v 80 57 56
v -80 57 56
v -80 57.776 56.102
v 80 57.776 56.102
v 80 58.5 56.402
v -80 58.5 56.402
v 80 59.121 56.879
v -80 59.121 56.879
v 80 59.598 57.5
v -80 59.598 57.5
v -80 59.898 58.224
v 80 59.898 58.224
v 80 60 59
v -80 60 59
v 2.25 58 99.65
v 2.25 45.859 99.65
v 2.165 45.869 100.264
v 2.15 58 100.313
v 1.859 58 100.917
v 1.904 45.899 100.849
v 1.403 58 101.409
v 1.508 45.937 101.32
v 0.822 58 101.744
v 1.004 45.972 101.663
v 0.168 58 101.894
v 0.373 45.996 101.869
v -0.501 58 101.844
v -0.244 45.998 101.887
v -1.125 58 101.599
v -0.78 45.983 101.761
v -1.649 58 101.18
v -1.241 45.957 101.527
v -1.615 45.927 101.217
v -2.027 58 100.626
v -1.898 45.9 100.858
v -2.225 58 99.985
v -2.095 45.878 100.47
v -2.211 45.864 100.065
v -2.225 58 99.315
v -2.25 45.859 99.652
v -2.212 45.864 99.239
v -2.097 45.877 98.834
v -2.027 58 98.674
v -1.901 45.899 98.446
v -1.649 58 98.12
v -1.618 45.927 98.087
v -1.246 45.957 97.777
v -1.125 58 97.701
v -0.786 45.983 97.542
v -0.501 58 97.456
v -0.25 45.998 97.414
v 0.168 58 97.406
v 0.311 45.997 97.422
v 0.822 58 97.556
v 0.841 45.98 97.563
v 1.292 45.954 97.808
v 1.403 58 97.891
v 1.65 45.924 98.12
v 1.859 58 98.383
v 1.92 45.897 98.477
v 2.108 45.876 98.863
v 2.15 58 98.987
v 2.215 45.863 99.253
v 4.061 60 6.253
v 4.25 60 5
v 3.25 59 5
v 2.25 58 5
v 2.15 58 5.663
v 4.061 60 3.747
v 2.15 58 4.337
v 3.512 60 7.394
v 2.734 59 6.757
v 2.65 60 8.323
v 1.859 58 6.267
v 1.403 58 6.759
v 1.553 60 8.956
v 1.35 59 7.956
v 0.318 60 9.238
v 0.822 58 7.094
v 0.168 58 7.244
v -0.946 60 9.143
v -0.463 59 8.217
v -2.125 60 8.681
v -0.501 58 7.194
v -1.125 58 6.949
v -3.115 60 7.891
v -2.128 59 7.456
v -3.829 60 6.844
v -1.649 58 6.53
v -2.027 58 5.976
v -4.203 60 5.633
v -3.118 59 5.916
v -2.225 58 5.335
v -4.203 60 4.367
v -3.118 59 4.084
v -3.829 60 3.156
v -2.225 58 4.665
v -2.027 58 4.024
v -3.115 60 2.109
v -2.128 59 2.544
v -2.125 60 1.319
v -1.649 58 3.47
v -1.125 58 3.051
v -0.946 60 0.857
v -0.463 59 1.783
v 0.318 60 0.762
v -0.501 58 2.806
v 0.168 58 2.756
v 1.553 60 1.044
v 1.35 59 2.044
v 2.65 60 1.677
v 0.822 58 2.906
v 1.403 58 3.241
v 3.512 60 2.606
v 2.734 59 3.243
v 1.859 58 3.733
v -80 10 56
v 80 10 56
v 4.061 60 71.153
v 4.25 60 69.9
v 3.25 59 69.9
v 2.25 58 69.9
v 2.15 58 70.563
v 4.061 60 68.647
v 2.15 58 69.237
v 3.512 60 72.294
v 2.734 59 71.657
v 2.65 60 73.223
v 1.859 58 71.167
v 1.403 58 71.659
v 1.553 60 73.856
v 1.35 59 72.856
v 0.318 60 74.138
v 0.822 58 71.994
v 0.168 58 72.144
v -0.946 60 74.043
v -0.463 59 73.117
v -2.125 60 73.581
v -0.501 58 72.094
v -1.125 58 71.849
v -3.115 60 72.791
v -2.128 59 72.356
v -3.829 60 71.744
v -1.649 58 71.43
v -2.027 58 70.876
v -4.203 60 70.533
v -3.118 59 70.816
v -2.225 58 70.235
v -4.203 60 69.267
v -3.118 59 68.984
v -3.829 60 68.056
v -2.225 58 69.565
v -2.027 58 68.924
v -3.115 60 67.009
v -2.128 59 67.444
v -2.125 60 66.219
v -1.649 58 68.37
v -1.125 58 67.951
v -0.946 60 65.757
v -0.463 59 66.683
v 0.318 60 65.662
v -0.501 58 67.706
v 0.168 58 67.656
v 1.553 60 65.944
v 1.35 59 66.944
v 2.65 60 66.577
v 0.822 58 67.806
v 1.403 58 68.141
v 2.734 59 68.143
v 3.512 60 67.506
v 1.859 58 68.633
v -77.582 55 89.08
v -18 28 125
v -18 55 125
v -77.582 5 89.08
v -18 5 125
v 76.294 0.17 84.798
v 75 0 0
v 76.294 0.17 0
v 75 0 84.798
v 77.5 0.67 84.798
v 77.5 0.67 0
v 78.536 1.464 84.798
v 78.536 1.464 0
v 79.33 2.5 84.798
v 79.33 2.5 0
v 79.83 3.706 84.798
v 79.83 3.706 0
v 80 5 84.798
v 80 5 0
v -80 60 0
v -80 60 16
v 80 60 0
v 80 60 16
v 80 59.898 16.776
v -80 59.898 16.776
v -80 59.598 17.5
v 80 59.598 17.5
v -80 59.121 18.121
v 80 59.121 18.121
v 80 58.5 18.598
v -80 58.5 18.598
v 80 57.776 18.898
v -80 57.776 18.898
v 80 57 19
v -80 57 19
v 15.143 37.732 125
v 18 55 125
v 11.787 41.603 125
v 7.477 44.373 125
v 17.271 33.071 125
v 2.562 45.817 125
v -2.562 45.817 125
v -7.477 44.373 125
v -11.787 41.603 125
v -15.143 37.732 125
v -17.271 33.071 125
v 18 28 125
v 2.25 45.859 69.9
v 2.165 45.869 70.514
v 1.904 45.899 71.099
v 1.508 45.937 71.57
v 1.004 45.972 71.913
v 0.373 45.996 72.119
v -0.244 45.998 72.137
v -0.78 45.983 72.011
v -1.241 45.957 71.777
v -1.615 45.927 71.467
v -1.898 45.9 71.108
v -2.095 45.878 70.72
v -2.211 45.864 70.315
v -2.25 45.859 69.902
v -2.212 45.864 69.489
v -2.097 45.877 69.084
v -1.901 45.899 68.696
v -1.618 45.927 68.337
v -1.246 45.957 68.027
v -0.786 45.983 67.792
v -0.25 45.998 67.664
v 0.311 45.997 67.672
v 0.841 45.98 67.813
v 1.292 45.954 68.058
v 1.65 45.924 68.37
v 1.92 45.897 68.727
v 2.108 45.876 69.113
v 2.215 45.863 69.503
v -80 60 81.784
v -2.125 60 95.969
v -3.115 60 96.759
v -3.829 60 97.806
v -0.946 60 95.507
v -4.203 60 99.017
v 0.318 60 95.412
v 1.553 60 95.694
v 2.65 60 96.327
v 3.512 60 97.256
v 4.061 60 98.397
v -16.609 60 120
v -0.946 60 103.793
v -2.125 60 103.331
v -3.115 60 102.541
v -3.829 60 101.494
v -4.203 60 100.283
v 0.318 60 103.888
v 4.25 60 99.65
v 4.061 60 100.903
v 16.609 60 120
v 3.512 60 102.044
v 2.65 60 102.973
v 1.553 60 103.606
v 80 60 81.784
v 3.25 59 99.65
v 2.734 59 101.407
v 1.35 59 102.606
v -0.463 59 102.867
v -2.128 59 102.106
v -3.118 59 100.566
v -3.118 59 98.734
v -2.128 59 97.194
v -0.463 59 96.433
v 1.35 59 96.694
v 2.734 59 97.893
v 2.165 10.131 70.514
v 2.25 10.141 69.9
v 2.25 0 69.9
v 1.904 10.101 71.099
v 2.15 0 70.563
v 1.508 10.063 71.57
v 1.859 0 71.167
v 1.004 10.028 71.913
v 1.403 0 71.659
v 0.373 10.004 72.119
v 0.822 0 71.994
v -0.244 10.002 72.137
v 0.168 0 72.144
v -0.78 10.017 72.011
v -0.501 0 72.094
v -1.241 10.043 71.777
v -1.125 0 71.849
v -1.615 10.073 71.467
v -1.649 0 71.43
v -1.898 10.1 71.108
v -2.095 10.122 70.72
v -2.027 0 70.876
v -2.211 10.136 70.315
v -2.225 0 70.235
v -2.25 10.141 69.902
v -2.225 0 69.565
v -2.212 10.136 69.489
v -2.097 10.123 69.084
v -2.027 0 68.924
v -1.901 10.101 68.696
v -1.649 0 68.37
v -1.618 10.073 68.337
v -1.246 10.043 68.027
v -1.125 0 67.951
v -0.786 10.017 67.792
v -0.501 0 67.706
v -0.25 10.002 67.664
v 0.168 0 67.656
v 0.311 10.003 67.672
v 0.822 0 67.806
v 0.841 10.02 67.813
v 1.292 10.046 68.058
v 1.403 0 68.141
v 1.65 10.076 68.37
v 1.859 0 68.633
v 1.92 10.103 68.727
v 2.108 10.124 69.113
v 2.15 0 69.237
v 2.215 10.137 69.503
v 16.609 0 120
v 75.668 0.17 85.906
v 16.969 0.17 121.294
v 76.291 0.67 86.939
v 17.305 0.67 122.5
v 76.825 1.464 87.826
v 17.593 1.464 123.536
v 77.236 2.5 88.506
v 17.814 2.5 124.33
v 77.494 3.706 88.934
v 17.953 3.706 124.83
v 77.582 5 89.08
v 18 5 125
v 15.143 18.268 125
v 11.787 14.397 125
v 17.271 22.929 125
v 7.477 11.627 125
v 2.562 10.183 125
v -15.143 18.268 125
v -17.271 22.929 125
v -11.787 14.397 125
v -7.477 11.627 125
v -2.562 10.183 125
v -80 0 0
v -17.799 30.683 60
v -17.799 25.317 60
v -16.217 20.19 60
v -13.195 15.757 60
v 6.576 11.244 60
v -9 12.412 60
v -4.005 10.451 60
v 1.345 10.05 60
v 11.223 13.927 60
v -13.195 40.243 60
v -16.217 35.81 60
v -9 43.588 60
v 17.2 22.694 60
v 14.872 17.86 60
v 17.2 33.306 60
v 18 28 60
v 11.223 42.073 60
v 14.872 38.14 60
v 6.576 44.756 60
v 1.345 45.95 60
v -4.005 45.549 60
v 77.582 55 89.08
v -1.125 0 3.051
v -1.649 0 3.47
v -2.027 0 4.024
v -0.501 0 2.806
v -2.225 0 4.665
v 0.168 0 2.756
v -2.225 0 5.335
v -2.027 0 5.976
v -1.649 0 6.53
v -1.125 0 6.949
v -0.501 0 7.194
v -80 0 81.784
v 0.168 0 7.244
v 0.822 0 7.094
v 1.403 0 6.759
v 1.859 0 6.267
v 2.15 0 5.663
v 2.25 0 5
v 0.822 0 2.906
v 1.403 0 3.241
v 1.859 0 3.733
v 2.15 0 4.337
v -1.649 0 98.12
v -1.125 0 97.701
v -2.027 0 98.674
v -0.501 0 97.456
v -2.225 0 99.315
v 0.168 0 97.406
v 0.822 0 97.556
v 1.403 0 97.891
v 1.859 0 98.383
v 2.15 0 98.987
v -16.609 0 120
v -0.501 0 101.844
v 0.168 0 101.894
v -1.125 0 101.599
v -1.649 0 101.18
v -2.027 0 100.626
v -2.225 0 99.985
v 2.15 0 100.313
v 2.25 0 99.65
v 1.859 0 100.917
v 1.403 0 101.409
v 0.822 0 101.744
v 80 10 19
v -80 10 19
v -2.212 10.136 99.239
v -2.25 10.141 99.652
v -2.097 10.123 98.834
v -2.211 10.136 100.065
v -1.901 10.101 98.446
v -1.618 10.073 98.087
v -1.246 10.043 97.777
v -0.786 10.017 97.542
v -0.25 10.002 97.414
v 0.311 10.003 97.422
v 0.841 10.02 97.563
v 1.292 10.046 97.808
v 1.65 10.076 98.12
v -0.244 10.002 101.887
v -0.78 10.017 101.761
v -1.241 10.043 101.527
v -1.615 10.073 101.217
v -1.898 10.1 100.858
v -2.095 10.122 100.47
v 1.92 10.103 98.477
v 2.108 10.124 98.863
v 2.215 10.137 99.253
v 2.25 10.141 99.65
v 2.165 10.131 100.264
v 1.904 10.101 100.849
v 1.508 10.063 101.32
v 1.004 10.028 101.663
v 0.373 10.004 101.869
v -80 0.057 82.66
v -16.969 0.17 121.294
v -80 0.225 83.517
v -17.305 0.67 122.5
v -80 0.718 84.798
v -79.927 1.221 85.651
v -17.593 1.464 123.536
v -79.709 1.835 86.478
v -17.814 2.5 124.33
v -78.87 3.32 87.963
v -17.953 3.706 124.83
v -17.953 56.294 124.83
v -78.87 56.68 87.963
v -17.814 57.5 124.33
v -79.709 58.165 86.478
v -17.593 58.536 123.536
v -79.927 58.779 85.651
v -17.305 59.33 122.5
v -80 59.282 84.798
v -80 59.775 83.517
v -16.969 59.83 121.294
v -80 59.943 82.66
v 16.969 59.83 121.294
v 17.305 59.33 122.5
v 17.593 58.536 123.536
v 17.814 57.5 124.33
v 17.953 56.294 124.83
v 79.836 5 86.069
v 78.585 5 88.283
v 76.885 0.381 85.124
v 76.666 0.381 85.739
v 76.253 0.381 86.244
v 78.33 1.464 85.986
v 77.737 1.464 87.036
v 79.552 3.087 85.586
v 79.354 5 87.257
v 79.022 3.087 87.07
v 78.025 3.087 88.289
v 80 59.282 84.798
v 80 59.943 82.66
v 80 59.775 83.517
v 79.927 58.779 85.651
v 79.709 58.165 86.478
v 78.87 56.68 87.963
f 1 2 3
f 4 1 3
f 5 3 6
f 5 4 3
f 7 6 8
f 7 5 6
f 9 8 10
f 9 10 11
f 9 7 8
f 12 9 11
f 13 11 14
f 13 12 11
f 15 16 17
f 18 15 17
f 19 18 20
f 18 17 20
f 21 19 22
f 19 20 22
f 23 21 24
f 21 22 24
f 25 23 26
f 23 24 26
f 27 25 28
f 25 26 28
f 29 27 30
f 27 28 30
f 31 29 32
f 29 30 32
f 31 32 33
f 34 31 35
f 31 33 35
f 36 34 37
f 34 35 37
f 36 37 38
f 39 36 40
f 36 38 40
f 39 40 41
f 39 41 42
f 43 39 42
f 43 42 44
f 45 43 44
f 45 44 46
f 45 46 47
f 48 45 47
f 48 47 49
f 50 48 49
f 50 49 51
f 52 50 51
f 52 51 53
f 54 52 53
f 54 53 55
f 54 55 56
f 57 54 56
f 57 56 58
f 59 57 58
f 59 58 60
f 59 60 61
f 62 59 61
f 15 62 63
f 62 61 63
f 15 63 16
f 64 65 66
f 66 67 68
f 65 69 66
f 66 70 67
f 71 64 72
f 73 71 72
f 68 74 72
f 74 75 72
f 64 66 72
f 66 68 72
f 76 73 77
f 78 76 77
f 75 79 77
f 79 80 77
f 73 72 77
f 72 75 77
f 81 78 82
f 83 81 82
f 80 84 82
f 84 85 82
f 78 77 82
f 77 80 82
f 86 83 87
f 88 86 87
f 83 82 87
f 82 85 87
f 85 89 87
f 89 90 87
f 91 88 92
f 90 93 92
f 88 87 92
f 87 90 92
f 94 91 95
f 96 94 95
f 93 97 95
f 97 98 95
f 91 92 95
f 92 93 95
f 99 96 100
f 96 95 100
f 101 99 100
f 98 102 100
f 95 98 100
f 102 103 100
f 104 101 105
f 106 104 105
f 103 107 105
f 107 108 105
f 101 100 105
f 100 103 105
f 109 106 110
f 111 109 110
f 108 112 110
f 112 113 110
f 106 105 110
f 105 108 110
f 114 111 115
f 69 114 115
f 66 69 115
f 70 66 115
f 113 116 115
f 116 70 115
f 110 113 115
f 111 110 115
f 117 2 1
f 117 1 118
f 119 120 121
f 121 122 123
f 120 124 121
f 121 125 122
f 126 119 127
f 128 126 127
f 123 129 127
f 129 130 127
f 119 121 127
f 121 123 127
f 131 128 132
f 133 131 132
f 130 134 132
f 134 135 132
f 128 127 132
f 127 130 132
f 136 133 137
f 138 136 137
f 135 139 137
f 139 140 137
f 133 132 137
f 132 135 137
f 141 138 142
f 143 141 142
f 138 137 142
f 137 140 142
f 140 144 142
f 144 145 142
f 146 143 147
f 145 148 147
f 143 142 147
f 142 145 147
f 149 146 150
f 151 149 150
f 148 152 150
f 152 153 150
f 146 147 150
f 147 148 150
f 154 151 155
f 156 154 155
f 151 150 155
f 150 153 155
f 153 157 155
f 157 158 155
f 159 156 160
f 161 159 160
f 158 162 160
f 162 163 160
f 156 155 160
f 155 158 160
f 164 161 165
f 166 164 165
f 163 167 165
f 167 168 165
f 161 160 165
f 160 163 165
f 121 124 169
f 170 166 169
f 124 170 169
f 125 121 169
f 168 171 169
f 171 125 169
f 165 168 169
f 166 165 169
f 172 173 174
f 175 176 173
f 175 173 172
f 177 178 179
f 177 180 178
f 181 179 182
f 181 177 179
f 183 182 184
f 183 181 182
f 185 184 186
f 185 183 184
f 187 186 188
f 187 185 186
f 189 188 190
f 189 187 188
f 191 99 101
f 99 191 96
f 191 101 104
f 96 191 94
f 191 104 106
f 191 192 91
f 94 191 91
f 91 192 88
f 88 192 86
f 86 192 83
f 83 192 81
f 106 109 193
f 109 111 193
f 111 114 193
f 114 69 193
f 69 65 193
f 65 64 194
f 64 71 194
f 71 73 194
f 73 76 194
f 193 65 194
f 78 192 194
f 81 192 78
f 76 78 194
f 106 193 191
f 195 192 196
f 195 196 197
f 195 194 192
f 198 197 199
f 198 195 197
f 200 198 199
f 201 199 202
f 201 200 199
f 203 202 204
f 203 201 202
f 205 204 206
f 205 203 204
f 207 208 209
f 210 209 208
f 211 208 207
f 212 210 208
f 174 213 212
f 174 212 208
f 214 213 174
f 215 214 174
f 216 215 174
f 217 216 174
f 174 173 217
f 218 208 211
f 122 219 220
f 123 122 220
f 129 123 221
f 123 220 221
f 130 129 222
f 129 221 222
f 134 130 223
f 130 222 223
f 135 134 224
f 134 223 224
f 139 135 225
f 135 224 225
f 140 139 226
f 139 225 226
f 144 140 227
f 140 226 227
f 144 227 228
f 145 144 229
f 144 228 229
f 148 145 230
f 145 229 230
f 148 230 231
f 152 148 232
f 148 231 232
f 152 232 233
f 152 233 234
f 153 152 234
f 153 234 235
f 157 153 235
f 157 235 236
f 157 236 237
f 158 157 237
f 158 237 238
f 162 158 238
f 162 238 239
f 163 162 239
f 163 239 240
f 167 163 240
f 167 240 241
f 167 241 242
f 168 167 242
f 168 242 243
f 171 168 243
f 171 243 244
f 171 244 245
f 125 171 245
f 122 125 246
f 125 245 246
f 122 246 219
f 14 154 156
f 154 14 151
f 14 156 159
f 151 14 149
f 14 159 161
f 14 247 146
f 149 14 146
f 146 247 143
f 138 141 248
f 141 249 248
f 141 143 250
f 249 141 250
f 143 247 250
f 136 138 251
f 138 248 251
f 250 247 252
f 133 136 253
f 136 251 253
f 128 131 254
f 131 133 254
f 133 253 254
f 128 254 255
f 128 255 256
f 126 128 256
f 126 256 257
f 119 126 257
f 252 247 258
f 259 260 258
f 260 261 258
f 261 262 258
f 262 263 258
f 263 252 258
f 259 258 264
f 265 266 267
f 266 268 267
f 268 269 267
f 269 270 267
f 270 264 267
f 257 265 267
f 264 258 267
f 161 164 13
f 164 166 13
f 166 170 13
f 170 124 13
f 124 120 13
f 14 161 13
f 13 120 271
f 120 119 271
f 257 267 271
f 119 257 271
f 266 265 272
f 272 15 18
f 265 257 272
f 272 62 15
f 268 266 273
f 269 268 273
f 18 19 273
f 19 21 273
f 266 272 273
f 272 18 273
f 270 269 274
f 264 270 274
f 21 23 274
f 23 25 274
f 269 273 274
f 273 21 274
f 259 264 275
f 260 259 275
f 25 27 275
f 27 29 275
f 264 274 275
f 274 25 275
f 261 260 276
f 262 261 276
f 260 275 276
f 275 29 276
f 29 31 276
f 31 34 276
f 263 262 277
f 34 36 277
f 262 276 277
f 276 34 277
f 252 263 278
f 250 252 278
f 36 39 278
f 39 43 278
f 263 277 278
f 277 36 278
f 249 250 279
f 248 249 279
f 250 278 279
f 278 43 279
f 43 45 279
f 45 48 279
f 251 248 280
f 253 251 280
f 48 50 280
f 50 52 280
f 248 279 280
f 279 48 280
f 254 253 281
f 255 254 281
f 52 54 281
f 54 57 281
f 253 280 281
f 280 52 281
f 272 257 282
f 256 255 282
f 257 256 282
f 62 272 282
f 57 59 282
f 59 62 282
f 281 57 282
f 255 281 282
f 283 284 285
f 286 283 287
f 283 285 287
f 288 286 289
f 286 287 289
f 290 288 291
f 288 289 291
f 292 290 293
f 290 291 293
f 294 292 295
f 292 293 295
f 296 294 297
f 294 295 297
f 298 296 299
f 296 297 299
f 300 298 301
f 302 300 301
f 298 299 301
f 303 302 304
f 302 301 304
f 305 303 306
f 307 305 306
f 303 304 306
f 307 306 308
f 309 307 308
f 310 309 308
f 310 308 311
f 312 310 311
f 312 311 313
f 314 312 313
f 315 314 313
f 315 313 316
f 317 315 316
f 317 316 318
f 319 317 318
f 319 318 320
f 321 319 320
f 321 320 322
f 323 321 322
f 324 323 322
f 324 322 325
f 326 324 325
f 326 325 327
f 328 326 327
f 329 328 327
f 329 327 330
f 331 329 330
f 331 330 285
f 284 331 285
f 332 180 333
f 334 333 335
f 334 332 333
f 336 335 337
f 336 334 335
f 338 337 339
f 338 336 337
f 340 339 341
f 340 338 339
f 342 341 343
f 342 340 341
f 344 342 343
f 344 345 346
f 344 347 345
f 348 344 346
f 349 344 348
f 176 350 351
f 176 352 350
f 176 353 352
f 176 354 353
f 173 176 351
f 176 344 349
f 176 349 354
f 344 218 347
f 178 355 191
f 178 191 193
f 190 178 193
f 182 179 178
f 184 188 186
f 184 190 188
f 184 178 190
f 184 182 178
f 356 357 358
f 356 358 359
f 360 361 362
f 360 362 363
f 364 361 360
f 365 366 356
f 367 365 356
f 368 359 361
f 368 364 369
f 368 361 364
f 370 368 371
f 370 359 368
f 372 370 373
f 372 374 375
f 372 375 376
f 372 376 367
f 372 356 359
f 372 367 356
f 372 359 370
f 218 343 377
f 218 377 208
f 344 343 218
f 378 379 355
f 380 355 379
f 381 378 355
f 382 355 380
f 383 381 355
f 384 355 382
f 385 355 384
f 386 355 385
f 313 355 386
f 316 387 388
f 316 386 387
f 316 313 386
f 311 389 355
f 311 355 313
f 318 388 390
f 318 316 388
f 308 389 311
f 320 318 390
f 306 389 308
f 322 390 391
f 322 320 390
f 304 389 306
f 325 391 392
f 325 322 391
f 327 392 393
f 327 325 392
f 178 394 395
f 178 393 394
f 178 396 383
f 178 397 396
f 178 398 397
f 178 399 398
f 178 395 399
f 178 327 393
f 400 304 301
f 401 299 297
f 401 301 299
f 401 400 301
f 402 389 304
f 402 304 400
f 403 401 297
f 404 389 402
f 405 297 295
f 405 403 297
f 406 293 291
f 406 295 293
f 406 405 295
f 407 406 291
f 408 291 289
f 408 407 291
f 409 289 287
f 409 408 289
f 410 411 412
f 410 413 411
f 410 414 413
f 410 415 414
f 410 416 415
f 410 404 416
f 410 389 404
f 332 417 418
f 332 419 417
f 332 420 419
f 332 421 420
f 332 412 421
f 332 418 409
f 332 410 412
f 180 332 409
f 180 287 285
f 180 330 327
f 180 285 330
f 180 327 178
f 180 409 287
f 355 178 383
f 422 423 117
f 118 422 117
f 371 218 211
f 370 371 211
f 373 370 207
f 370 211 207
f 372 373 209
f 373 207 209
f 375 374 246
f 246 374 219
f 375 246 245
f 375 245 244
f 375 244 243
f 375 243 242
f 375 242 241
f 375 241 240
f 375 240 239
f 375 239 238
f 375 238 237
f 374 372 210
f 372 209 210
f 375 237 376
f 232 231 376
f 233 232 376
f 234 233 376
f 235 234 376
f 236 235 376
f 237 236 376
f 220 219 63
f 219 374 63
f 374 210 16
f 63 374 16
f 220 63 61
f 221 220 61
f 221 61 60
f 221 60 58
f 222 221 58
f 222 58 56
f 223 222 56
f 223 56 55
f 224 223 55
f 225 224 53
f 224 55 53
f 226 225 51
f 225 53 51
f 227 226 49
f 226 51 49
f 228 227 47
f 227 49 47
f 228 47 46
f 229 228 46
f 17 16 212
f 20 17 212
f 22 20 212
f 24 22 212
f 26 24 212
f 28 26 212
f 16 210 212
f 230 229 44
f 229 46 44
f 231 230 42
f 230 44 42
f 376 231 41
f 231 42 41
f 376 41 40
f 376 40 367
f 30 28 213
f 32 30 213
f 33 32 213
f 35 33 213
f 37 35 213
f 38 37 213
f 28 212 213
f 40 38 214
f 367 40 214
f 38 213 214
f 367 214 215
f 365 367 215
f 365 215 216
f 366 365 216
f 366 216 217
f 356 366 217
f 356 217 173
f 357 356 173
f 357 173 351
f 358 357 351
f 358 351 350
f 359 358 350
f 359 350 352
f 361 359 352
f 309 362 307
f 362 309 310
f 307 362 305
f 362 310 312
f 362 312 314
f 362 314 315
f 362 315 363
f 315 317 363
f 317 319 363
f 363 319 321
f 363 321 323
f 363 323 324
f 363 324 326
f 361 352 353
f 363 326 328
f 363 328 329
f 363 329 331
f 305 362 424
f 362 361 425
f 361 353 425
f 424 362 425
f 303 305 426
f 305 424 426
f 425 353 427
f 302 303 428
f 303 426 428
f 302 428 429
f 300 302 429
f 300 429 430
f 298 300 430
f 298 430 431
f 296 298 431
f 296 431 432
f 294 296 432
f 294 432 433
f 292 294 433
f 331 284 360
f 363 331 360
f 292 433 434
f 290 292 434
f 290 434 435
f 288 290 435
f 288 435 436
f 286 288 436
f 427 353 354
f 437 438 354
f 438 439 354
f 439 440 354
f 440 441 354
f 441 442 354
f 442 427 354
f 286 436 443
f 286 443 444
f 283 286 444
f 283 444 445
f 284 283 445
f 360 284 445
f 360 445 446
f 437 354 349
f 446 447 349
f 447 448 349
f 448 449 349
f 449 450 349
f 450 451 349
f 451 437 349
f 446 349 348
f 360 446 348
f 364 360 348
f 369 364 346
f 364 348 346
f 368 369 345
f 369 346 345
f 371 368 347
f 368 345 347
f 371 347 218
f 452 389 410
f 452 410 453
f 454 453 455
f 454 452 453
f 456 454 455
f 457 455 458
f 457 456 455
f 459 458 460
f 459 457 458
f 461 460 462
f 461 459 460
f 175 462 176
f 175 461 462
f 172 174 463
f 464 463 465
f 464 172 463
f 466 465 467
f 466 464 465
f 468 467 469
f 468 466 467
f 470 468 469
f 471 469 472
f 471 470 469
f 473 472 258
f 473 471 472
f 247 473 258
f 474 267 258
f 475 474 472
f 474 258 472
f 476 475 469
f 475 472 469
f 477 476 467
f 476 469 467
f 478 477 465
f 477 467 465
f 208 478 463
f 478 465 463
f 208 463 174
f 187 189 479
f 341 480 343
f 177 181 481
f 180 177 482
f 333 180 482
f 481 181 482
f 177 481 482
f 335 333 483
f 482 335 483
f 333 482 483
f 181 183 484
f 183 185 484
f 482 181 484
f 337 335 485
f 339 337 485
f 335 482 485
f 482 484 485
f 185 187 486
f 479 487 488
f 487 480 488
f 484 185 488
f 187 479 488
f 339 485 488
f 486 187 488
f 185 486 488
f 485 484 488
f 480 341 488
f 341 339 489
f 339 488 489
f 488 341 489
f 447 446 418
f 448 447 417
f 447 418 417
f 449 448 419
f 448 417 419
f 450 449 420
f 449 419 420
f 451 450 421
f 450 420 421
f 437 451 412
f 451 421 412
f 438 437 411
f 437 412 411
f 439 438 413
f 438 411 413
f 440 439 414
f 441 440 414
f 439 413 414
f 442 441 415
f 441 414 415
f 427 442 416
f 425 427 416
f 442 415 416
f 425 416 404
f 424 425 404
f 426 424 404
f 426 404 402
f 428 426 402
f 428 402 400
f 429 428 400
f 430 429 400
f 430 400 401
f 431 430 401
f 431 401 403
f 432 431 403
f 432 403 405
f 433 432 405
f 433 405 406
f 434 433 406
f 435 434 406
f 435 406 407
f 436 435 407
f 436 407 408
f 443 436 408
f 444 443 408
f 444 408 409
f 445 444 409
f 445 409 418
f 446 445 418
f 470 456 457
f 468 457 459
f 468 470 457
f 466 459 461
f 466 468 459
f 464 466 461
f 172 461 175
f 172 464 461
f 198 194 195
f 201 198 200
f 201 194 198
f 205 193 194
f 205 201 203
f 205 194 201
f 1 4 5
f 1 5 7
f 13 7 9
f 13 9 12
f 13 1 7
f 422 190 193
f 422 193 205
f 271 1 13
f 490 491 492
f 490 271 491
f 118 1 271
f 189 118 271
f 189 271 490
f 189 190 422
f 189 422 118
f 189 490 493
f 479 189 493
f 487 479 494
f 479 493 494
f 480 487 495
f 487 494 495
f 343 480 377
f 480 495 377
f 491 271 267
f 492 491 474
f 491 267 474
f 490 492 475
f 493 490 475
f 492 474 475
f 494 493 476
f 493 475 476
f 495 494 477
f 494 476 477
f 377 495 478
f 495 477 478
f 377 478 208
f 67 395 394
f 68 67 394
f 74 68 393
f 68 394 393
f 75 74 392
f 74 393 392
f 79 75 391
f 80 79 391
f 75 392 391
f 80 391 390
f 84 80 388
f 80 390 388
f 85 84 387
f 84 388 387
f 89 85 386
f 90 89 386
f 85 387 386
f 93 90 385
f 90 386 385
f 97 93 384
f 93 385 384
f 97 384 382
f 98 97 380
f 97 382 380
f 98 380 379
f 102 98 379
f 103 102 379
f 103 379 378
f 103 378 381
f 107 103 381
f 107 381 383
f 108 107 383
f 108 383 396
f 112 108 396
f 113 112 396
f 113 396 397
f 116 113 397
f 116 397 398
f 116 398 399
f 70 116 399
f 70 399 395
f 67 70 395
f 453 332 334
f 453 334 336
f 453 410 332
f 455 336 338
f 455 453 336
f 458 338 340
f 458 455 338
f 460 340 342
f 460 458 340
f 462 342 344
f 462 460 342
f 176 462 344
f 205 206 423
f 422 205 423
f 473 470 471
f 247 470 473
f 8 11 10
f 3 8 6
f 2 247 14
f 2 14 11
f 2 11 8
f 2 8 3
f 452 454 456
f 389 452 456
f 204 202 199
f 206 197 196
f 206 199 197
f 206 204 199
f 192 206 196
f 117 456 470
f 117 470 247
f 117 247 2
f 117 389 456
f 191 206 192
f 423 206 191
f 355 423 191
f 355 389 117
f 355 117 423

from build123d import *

# Parameters (mm, degrees)
F1_DEPTH = 60
F3_W     = 50
F3_H     = 37
F4_DEPTH = 160
F5_DEPTH = 65
F6_R     = 3
F7_R     = 5
F8_R     = 2.25
F9_DEPTH = 60.001
F10_SIZE = 2


with BuildPart() as f1:
    # F0 (on Front) → F1 (new body)
    with BuildSketch(Plane.XZ):
        Polygon((-80, 87.622), (-80, 0), (80, 0), (80, 87.622), (18, 125), (-18, 125), align=None)
    extrude(amount=-F1_DEPTH)

    # F3 (on face) → F4 (cut, through all)
    with BuildSketch(Plane(origin=(-80, 0, 0), x_dir=(0, -1, 0), z_dir=(-1, 0, 0))):
        with Locations((-35, 37.5)):
            Rectangle(F3_W, F3_H)
    extrude(amount=-F4_DEPTH, mode=Mode.SUBTRACT)

    # F2 (on face) → F5 (cut)
    with BuildSketch(Plane.XY.offset(125)):
        with BuildLine():
            ThreePointArc((-18, 28), (0, 10), (18, 28))
            ThreePointArc((18, 28), (0, 46), (-18, 28))
        make_face()
    extrude(amount=-F5_DEPTH, mode=Mode.SUBTRACT)

    # F6
    f6_edges = [f1.edges().sort_by_distance(p)[0] for p in [
        (0, 60, 56),
        (0, 60, 19),
    ]]
    fillet(f6_edges, radius=F6_R)

    # F7
    f7_edges = [f1.edges().sort_by_distance(p)[0] for p in [
        (0, 60, 125),
        (-49, 60, 106.311),
        (49, 60, 106.311),
        (-80, 30, 87.622),
        (-49, 0, 106.311),
        (49, 0, 106.311),
        (80, 30, 87.622),
        (0, 0, 125),
        (80, 0, 43.811),
    ]]
    fillet(f7_edges, radius=F7_R)

    # F8 (on face) → F9 (cut, through all)
    with BuildSketch(Plane.XZ):
        with Locations((0, 99.65)):
            Circle(F8_R)
        with Locations((0, 69.9)):
            Circle(F8_R)
        with Locations((0, 5)):
            Circle(F8_R)
    extrude(amount=-F9_DEPTH, mode=Mode.SUBTRACT)

    # F10
    f10_edges = [f1.edges().sort_by_distance(p)[0] for p in [
        (-2.25, 60, 99.65),
        (-2.25, 60, 69.9),
        (-2.25, 60, 5),
    ]]
    chamfer(f10_edges, length=F10_SIZE)


solid = f1.part
